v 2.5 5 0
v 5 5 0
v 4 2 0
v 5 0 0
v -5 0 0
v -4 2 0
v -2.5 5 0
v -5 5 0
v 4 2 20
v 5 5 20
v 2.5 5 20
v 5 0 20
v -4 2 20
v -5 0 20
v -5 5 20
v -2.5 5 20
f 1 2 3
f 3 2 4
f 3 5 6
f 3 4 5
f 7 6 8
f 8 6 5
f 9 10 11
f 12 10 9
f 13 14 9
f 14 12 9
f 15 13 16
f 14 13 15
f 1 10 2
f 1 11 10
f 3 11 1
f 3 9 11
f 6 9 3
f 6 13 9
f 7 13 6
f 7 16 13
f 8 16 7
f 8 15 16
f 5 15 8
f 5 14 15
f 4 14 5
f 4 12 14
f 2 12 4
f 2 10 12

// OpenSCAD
module v_track(height=5, width=10, width_track_top=5, width_track_bottom=8, depth_track=3, length=50)
{
    translate([-width/2, 0, 0])
    linear_extrude(length)
    difference()
    {
        square([width, height]);
        polygon(points = [[width/2 - width_track_bottom/2, height - depth_track],
                          [width/2 - width_track_top/2, height],
                          [width/2 + width_track_top/2, height],
                          [width/2 + width_track_bottom/2, height - depth_track]]);
    }
}

v_track(length=20);
